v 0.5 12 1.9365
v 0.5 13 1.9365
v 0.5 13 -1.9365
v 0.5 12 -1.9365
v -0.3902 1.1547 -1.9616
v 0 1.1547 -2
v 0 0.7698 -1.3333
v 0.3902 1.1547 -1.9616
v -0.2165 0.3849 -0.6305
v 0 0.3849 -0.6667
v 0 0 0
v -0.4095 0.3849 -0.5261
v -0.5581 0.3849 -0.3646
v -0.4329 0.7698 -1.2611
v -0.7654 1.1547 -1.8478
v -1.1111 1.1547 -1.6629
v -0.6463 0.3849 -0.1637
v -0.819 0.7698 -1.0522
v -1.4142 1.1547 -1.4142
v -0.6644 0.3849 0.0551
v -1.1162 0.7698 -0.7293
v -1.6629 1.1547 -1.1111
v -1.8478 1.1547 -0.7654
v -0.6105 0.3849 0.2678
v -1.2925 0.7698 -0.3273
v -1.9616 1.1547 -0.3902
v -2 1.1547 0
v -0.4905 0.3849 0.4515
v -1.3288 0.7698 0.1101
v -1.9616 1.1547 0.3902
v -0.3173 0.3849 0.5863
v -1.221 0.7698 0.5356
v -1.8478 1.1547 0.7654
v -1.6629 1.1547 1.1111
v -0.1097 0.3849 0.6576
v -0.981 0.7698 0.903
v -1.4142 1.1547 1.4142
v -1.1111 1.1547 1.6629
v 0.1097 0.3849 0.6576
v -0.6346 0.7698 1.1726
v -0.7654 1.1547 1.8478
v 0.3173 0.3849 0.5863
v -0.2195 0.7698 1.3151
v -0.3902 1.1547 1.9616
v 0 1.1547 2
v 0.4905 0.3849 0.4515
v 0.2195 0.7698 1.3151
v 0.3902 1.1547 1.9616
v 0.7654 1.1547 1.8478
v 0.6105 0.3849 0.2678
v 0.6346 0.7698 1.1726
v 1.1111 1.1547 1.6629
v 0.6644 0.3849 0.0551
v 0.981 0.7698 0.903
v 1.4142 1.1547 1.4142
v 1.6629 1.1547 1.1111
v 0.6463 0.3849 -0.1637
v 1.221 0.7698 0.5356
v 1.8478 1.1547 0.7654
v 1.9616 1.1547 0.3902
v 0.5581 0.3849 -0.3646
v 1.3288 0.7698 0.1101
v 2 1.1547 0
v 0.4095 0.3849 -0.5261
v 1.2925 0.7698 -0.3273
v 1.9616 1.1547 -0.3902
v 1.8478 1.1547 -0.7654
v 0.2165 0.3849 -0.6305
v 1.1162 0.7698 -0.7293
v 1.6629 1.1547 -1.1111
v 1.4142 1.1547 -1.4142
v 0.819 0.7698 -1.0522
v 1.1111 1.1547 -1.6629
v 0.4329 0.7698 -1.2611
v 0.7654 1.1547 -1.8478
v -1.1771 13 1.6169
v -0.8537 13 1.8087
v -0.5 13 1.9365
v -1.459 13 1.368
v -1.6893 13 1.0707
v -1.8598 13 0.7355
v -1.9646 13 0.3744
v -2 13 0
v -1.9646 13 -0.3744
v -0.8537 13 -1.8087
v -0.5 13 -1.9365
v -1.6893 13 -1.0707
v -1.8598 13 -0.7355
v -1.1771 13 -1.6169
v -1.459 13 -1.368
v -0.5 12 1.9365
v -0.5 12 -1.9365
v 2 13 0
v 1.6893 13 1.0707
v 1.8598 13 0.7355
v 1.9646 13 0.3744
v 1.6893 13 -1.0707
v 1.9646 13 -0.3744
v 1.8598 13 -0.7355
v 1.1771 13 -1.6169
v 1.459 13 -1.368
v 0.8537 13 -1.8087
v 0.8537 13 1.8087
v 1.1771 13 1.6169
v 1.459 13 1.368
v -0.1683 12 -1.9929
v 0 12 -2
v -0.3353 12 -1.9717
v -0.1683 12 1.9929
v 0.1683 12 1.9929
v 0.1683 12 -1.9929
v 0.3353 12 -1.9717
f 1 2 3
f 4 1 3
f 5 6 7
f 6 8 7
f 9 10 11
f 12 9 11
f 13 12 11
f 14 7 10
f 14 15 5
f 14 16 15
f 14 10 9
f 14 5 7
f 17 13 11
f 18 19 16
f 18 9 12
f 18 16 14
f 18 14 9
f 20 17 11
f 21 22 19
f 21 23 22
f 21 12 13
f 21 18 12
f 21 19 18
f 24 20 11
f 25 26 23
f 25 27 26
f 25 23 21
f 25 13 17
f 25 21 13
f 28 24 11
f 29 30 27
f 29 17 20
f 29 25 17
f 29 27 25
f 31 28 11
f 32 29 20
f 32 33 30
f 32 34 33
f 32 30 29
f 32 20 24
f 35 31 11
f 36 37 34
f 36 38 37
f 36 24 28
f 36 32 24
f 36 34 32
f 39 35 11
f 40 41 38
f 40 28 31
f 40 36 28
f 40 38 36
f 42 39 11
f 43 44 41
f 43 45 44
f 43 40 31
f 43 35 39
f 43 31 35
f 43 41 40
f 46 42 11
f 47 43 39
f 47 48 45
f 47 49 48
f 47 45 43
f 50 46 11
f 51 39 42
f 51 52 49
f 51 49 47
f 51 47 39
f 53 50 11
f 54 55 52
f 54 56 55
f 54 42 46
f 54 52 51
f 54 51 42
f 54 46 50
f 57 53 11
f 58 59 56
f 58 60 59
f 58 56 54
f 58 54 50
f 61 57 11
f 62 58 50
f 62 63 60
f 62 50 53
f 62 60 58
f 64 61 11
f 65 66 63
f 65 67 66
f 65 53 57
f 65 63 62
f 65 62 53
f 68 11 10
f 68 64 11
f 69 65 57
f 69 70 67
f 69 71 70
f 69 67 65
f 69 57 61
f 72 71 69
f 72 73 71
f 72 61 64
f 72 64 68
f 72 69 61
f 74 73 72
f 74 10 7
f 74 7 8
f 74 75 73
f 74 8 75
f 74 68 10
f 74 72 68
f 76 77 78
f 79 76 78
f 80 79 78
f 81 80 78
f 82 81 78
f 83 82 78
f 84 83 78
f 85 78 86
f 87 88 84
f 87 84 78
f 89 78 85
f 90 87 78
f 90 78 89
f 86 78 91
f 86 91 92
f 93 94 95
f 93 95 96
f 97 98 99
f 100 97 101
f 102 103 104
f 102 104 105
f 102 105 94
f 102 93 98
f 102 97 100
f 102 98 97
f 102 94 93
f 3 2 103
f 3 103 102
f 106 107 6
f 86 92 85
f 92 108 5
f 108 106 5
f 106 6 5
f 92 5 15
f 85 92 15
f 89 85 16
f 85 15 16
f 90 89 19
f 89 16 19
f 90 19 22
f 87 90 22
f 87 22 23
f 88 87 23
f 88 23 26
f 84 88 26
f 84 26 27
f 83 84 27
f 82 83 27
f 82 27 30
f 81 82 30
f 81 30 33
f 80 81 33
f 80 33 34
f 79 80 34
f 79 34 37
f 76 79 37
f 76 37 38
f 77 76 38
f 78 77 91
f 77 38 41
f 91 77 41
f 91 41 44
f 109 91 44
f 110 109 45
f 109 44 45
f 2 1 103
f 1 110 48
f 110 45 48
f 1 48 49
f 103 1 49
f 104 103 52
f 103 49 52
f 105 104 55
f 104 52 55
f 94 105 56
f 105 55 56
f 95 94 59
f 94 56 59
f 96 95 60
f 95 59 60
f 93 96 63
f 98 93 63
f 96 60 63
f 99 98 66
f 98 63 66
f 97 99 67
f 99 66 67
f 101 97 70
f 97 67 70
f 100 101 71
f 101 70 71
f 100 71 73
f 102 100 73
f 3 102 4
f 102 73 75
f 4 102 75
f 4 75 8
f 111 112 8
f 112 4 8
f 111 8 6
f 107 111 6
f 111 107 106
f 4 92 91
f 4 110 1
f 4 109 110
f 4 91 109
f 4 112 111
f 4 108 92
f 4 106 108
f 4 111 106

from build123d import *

# Parameters (mm, degrees)
SKETCH1_R           = 2
BOSS_EXTRUDE1_DEPTH = 13
CHAMFER1_SIZE       = 2
CHAMFER1_SIZE2      = 1.154700538
SKETCH2_W           = 1
SKETCH2_H           = 4.464568748
CUT_EXTRUDE1_DEPTH  = 1


with BuildPart() as part:
    # Sketch1 → Boss-Extrude1 (new body)
    with BuildSketch(Plane(origin=(0, 0, 0), x_dir=(1, 0, 0), z_dir=(0, 1, 0))):
        with Locations(Location((0, 0, 0), (0, 0, 90))):
            Circle(SKETCH1_R)
    extrude(amount=BOSS_EXTRUDE1_DEPTH)

    # Chamfer1
    chamfer1_edges = [part.edges().sort_by_distance(p)[0] for p in [
        (0, 0, 2),
    ]]
    chamfer1_side = [part.faces().sort_by_distance(p)[0] for p in [
        (0, 0, 0),
    ]]
    chamfer(chamfer1_edges, length=CHAMFER1_SIZE, length2=CHAMFER1_SIZE2, reference=chamfer1_side[0])

    # Sketch2 → Cut-Extrude1 (cut)
    with BuildSketch(Plane(origin=(0, 13, 0), x_dir=(1, 0, 0), z_dir=(0, 1, 0))):
        with Locations((0, -0.081308371)):
            Rectangle(SKETCH2_W, SKETCH2_H)
    extrude(amount=-CUT_EXTRUDE1_DEPTH, mode=Mode.SUBTRACT)


solid = part.part
